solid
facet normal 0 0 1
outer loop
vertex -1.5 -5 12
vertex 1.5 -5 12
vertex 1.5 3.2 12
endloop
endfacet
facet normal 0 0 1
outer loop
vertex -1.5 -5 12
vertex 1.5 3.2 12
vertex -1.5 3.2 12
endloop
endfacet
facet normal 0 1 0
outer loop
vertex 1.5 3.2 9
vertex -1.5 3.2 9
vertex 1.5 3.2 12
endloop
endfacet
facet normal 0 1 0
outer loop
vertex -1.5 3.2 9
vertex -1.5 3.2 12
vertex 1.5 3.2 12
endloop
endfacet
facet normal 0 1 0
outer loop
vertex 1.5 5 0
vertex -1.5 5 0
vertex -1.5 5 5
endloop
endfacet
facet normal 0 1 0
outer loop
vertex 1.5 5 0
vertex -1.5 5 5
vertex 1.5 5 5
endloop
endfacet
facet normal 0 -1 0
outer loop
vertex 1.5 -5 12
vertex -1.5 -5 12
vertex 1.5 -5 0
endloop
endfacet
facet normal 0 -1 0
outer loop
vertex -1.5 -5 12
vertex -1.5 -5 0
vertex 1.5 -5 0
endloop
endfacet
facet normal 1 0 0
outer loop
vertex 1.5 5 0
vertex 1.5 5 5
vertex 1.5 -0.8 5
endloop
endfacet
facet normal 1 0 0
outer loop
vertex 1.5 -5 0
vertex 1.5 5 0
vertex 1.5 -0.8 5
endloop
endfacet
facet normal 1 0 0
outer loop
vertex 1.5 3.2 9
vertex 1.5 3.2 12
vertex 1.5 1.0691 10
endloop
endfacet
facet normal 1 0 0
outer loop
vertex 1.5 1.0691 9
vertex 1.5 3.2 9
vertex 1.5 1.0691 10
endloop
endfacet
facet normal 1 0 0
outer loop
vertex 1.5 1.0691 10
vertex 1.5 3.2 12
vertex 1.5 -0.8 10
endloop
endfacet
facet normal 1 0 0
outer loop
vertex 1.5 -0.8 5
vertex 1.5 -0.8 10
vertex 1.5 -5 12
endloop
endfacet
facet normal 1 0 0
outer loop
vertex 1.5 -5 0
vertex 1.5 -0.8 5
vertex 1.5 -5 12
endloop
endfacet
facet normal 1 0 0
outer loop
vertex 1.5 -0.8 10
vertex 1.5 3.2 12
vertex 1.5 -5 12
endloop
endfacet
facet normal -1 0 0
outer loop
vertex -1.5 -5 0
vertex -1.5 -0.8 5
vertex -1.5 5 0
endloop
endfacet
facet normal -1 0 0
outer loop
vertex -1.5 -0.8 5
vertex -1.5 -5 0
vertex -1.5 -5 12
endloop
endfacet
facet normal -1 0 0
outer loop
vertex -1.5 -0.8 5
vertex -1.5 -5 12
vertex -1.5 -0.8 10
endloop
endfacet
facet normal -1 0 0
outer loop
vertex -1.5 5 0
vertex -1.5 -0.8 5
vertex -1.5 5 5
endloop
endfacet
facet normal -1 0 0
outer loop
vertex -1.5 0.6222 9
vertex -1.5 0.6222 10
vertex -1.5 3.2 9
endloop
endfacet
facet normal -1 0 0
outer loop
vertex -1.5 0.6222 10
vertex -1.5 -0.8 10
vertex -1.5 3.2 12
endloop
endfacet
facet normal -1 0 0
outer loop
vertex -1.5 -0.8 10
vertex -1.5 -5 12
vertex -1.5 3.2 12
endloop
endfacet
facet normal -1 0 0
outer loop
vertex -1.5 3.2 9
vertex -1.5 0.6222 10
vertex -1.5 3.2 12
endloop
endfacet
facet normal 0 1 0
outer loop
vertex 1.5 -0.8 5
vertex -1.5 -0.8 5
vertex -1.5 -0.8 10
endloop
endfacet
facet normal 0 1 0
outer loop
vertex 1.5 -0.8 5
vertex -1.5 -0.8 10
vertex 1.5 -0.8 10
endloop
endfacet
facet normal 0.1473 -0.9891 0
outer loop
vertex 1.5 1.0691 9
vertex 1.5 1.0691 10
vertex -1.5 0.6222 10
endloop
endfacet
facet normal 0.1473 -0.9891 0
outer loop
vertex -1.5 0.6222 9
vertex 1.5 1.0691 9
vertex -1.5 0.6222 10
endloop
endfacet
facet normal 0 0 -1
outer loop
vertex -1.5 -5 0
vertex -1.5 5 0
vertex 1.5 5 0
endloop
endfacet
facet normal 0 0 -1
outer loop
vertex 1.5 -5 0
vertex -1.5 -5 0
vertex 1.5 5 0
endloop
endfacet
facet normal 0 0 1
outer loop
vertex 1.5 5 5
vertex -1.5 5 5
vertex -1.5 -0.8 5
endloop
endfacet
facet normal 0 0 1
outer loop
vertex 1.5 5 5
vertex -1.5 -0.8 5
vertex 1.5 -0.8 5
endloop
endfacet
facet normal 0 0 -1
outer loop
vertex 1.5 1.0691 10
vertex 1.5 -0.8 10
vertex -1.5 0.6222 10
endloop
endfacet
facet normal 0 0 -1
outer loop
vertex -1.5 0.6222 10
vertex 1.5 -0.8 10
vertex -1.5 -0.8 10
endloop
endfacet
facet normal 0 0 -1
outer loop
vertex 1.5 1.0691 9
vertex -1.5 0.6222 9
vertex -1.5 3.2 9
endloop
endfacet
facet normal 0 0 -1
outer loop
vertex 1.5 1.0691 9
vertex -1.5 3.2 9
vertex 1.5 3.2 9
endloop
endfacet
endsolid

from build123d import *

# Parameters (mm, degrees)
F0_W     = 3
F0_H     = 10
F1_DEPTH = 5
F2_W     = 3
F2_H     = 4.2
F3_DEPTH = 7
F4_W     = 3
F4_H     = 2
F5_DEPTH = 4
F7_DEPTH = 1


with BuildPart() as f1:
    # F0 (on Top) → F1 (new body)
    with BuildSketch(Plane.XY):
        Rectangle(F0_W, F0_H)
    extrude(amount=F1_DEPTH)

    # F2 (on face) → F3 (join)
    with BuildSketch(Plane.XY.offset(5)):
        with Locations((0, -2.9)):
            Rectangle(F2_W, F2_H)
    extrude(amount=F3_DEPTH)

    # F4 (on face) → F5 (join)
    with BuildSketch(Plane(origin=(0, -0.8, 0), x_dir=(-1, 0, 0), z_dir=(0, 1, 0))):
        with Locations((0, 11)):
            Rectangle(F4_W, F4_H)
    extrude(amount=F5_DEPTH)

    # F6 (on face) → F7 (join)
    with BuildSketch(Plane(origin=(0, 0, 10), x_dir=(1, 0, 0), z_dir=(0, 0, -1))):
        Polygon((1.5, -1.069119), (-1.5, -0.6222), (-1.5, -3.2), (1.5, -3.2), align=None)
    extrude(amount=F7_DEPTH)


solid = f1.part
